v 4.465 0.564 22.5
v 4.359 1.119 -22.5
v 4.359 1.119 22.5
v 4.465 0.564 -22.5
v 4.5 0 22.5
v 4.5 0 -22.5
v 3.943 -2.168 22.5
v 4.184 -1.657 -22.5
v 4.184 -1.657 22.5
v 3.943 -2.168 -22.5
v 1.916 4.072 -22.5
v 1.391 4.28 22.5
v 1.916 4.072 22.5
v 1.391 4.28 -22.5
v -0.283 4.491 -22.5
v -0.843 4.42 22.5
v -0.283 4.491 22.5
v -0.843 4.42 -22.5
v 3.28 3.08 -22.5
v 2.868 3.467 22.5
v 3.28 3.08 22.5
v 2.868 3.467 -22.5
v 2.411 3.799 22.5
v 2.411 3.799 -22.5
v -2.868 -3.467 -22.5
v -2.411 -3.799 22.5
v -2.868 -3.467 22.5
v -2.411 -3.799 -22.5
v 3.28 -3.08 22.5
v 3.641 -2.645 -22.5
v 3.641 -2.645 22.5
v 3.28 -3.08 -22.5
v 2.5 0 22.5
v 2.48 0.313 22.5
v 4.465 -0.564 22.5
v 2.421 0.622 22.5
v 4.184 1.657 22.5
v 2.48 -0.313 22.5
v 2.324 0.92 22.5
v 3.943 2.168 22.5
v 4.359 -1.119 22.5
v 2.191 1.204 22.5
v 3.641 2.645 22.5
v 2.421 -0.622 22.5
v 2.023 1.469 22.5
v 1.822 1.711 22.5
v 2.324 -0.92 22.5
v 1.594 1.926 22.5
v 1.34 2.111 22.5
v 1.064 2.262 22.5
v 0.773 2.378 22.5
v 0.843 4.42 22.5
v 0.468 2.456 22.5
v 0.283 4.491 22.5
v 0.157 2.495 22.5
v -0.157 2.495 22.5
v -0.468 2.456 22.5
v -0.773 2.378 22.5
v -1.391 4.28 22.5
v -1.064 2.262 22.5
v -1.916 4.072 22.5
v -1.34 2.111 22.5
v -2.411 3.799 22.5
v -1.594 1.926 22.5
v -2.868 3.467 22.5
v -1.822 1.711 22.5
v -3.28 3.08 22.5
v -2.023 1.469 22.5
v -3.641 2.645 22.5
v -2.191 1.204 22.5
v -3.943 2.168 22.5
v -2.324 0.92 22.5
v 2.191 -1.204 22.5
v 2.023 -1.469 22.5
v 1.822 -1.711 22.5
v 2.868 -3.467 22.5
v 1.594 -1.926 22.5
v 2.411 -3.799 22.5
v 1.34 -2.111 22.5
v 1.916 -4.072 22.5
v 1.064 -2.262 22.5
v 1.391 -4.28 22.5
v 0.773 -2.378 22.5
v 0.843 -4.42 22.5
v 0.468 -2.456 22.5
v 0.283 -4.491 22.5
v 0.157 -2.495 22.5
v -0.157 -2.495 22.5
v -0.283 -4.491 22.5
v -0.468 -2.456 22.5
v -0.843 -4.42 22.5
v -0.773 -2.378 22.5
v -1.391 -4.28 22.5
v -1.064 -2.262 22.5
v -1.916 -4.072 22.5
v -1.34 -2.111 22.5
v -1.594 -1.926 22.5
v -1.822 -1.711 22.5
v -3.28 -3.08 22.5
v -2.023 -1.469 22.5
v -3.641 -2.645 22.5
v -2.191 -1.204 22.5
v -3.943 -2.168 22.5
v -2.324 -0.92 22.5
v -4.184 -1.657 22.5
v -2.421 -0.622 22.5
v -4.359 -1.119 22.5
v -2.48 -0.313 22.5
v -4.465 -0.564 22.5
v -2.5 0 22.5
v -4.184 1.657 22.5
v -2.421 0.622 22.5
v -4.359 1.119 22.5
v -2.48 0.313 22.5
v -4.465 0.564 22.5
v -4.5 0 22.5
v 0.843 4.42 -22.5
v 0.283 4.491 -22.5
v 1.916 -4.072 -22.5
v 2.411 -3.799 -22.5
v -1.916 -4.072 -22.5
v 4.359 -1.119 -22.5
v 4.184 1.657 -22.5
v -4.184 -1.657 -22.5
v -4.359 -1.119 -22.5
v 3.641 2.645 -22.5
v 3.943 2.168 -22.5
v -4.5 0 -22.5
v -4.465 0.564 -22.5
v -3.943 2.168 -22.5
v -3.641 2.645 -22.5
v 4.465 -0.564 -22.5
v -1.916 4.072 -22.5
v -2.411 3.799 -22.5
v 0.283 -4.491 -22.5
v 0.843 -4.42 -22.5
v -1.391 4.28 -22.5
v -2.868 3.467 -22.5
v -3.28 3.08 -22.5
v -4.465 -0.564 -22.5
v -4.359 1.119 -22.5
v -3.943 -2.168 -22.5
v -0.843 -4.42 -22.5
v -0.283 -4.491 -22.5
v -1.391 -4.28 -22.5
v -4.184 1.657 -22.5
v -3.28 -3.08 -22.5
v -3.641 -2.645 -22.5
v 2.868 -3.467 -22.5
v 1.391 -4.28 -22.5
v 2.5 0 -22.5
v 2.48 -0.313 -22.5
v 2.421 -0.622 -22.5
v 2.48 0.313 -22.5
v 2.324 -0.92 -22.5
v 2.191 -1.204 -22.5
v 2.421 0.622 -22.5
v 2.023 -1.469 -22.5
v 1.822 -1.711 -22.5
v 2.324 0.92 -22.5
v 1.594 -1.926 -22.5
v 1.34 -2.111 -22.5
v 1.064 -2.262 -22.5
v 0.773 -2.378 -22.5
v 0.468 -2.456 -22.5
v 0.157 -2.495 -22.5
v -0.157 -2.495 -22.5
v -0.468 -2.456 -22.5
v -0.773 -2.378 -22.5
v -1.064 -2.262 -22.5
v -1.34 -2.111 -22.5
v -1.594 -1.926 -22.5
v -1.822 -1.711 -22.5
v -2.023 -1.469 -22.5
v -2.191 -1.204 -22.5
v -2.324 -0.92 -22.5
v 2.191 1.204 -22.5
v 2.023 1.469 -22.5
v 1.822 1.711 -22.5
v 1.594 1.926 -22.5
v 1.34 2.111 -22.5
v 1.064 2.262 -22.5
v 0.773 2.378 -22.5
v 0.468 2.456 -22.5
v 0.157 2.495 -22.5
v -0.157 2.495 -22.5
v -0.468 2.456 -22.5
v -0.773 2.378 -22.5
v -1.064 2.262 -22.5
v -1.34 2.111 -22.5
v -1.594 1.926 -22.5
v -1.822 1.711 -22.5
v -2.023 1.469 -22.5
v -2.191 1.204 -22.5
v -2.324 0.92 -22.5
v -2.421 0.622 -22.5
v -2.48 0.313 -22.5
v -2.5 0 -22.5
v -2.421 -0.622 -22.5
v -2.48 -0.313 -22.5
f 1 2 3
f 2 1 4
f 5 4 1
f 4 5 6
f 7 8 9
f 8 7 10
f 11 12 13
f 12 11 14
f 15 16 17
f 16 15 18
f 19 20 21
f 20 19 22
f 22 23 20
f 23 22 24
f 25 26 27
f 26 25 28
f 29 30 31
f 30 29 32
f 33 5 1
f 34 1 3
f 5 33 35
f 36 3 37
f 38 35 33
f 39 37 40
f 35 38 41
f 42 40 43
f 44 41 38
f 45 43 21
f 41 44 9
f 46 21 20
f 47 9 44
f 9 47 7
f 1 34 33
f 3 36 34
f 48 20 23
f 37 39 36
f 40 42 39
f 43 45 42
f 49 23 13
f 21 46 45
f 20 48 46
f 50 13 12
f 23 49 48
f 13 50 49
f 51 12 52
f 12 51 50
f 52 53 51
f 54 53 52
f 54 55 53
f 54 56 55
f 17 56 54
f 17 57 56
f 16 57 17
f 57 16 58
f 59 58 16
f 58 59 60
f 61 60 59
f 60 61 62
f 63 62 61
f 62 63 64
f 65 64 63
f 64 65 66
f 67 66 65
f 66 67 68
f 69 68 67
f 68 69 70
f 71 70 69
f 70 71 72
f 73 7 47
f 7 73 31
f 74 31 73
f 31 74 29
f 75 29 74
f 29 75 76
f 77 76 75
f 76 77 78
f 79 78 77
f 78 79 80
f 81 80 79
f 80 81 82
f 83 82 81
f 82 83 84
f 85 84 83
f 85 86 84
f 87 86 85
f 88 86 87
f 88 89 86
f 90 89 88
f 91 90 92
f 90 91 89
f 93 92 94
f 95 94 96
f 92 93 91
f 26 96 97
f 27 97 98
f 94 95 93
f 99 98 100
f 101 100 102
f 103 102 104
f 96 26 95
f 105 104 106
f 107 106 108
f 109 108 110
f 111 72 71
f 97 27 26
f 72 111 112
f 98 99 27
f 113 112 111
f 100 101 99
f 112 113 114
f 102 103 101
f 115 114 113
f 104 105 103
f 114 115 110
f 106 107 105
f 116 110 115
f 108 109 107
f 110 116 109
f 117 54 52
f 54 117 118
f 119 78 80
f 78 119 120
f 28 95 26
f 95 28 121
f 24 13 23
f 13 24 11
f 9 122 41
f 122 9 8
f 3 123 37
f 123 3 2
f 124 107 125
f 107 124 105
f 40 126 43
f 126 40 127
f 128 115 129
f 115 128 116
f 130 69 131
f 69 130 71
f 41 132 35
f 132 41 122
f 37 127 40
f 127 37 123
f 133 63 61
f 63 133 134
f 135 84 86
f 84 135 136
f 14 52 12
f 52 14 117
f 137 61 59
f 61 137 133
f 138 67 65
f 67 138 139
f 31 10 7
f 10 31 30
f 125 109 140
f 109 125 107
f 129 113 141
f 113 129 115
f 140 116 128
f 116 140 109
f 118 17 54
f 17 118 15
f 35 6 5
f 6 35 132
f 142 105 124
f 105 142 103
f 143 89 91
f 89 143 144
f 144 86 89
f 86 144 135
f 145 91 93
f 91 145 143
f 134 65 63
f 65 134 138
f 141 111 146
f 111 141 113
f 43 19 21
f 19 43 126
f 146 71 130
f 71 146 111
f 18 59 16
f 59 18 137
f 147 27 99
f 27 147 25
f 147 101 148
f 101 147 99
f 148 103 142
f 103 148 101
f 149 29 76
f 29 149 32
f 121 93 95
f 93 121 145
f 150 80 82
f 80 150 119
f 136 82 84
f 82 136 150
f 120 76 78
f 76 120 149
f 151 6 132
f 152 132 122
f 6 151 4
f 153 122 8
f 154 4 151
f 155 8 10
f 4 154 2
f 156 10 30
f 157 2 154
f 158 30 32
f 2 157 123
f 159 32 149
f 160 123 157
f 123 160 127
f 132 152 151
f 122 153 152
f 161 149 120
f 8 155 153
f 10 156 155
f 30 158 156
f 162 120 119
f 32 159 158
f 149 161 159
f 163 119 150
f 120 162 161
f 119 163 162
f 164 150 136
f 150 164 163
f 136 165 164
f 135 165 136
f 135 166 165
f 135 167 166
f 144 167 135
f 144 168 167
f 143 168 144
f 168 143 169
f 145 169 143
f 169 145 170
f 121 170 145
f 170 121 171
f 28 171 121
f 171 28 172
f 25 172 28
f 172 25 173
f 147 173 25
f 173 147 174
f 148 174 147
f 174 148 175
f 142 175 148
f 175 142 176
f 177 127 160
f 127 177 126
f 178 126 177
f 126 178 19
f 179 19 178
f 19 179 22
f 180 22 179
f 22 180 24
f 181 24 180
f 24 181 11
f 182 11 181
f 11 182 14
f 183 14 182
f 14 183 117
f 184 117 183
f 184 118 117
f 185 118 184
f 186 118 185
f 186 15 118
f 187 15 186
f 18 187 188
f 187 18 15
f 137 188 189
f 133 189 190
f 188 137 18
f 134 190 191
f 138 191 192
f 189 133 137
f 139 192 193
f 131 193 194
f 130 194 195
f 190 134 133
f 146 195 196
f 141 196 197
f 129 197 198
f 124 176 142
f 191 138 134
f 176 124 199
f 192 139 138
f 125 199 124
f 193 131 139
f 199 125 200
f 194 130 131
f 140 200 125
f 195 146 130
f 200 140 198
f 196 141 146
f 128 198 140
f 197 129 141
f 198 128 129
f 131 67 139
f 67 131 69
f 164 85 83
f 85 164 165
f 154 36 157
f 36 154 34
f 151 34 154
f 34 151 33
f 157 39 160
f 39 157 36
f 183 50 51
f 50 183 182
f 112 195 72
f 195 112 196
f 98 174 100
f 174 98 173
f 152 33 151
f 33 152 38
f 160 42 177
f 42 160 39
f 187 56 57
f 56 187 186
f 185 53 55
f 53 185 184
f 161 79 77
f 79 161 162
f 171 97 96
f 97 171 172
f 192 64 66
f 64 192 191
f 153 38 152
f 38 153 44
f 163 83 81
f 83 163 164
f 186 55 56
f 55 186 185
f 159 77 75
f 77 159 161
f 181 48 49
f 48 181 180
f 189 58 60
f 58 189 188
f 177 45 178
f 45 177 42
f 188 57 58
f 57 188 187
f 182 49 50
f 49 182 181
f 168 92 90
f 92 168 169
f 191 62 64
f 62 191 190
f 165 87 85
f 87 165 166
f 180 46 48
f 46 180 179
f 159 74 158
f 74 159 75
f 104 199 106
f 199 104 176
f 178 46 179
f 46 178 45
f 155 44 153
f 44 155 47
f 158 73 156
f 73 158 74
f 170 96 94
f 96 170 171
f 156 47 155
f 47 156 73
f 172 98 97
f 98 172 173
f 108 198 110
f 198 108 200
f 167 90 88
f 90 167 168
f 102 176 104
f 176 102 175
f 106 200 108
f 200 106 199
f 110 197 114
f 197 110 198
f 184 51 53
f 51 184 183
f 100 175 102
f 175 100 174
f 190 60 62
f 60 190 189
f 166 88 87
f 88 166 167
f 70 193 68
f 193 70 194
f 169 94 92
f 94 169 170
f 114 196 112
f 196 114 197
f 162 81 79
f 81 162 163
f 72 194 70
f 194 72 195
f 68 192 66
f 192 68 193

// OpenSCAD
$fn = 50;


difference() {
	union() {
		translate(v = [0, 0, -22.5000000000]) {
			cylinder(h = 45, r = 4.5000000000);
		}
	}
	union() {
		translate(v = [0, 0, -100.0000000000]) {
			cylinder(h = 200, r = 2.5000000000);
		}
	}
}
